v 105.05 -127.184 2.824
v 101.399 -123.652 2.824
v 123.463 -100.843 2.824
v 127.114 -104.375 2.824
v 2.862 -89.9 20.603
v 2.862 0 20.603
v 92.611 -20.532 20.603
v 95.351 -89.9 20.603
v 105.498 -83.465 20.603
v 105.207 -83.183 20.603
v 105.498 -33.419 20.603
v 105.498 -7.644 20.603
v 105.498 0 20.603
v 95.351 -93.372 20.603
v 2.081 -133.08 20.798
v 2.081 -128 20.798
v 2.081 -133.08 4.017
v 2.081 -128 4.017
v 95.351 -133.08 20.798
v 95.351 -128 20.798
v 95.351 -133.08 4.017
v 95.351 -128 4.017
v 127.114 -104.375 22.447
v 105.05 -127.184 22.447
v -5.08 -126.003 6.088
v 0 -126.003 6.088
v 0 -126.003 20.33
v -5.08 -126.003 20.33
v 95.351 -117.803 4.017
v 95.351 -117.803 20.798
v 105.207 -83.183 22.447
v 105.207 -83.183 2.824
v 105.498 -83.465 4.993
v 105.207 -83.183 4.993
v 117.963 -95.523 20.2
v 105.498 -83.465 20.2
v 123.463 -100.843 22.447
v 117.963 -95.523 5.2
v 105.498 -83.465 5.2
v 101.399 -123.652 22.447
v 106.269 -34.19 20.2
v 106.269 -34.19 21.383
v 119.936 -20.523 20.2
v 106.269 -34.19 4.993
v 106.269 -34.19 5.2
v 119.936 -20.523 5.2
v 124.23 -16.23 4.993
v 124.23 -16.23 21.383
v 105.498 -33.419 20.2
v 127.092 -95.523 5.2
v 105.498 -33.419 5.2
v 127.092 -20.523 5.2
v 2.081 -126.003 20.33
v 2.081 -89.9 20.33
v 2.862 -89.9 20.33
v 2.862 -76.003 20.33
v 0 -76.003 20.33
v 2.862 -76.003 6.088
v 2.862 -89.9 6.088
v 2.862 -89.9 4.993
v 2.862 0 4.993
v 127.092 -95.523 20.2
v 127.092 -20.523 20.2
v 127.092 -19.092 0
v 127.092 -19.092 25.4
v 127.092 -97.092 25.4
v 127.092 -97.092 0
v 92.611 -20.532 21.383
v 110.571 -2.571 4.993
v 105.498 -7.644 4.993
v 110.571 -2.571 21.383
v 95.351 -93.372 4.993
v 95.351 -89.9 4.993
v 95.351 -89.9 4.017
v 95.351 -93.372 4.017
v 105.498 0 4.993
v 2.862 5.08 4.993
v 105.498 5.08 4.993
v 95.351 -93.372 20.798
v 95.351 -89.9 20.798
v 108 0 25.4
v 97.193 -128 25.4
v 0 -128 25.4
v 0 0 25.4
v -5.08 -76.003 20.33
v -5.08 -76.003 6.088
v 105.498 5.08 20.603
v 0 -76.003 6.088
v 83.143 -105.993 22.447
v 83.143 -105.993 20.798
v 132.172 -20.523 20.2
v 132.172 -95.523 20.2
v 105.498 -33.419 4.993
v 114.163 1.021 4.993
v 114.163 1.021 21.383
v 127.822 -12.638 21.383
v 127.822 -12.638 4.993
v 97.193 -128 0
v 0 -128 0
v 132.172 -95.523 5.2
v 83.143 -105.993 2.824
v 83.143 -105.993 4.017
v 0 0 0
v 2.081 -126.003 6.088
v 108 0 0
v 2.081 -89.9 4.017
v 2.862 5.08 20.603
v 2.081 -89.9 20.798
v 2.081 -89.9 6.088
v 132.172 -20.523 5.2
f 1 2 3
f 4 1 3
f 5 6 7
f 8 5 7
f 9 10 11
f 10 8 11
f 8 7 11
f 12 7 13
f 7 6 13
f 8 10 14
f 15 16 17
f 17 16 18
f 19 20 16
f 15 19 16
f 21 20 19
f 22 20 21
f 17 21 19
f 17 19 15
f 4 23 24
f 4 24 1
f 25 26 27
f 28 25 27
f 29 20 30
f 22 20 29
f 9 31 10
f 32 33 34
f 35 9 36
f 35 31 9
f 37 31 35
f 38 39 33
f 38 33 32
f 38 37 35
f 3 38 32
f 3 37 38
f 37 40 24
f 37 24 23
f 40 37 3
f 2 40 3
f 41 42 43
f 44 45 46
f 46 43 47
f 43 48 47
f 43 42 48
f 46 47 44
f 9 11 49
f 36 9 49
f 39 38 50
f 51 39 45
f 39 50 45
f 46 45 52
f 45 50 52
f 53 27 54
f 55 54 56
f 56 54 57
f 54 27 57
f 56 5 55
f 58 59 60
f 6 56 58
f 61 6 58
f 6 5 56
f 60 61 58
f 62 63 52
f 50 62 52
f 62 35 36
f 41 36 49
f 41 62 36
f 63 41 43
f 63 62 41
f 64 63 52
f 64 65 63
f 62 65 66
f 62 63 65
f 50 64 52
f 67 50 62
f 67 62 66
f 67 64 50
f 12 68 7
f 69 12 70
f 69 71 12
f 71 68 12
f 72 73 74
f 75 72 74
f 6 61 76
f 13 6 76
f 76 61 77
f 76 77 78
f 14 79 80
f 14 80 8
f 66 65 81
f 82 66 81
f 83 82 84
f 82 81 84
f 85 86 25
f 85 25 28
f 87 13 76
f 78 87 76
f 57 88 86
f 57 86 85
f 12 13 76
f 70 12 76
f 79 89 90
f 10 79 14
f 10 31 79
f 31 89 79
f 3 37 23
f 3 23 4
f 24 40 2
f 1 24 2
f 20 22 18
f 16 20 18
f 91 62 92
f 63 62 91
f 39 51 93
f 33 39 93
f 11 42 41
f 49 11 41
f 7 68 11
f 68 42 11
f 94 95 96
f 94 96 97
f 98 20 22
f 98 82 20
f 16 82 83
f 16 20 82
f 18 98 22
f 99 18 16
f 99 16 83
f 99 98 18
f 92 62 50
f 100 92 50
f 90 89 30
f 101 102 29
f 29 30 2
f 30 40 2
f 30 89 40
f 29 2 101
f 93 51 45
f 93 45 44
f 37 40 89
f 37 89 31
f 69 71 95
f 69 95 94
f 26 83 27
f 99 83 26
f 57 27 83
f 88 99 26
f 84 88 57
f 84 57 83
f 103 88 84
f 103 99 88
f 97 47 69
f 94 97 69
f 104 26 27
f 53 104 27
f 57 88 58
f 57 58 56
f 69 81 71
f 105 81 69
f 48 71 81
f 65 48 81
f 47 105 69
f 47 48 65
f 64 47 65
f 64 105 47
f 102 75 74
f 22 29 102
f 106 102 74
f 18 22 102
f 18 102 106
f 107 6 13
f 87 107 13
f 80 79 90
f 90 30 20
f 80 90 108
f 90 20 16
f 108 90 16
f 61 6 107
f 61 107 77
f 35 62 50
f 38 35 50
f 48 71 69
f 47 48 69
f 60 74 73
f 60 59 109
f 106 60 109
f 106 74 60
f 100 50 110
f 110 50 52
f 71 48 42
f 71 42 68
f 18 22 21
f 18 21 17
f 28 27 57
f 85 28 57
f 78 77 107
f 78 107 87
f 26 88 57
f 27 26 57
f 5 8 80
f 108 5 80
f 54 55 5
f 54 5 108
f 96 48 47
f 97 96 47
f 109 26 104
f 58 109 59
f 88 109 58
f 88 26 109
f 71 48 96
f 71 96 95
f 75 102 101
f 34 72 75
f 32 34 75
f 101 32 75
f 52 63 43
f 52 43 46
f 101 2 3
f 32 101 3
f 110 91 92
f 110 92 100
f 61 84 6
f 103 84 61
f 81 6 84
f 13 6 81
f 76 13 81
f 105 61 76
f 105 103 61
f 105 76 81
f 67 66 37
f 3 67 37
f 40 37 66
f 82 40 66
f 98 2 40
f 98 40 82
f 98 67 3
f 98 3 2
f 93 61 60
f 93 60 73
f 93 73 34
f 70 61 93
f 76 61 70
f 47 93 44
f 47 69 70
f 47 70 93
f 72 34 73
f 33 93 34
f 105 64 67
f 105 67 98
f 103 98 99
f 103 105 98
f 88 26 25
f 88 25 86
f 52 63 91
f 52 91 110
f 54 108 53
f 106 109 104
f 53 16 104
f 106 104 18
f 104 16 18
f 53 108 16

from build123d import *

# Parameters (mm, degrees)
BOSS_EXTRUDE1_DEPTH = 25.4
SKETCH2_W           = 14.241894923
SKETCH2_H           = 50
CUT_EXTRUDE1_DEPTH  = 25.4
SKETCH3_W           = 15
SKETCH3_H           = 75
CUT_EXTRUDE2_DEPTH  = 114.391883
SKETCH4_W           = 93.269947502
SKETCH4_H           = 16.780785534
CUT_EXTRUDE3_DEPTH  = 38.1
SKETCH5_W           = 102.635967335
SKETCH5_H           = 15.610033055
CUT_EXTRUDE4_DEPTH  = 101.6
SKETCH6_W           = 16.390534708
SKETCH6_H           = 19.316430399
CUT_EXTRUDE5_DEPTH  = 25.4
SKETCH7_W           = 19.62251785
SKETCH7_H           = 31.734588897
CUT_EXTRUDE6_DEPTH  = 25.4
SKETCH4_2_W         = 93.269947502
SKETCH4_2_H         = 16.780785534
BOSS_EXTRUDE2_DEPTH = 5.08
SKETCH5_2_W         = 102.635967335
SKETCH5_2_H         = 15.610033055
BOSS_EXTRUDE4_DEPTH = 5.08
SKETCH7_2_W         = 19.62251785
SKETCH7_2_H         = 31.734588897
BOSS_EXTRUDE5_DEPTH = 5.08
SKETCH6_2_W         = 16.390534708
SKETCH6_2_H         = 19.316430399
BOSS_EXTRUDE6_DEPTH = 5.08
SKETCH3_2_W         = 15
SKETCH3_2_H         = 75
BOSS_EXTRUDE7_DEPTH = 5.08
SKETCH2_3_W         = 14.241894923
SKETCH2_3_H         = 50
BOSS_EXTRUDE8_DEPTH = 5.08


with BuildPart() as part:
    # Sketch1 → Boss-Extrude1 (new body)
    with BuildSketch(Plane.XY):
        Polygon((0, 0), (108, 0), (127.091883092, -19.091883092), (127.091883092, -97.091883092), (97.193068366, -128), (0, -128), align=None)
    extrude(amount=BOSS_EXTRUDE1_DEPTH)

    # Sketch2 → Cut-Extrude1 (cut)
    with BuildSketch(Plane.ZY):
        with Locations((13.208639104, -101.003494845)):
            Rectangle(SKETCH2_W, SKETCH2_H)
    extrude(amount=-CUT_EXTRUDE1_DEPTH, mode=Mode.SUBTRACT)

    # Sketch3 → Cut-Extrude2 (cut)
    with BuildSketch(Plane(origin=(127.091883092, 0, 0), x_dir=(0, 0, -1), z_dir=(1, 0, 0))):
        with Locations((-12.7, -58.023490523)):
            Rectangle(SKETCH3_W, SKETCH3_H)
    extrude(amount=-CUT_EXTRUDE2_DEPTH, mode=Mode.SUBTRACT)

    # Sketch4 → Cut-Extrude3 (cut)
    with BuildSketch(Plane(origin=(0, -128, 0), x_dir=(-1, 0, 0), z_dir=(0, -1, 0))):
        with Locations((-48.716410144, -12.40731188)):
            Rectangle(SKETCH4_W, SKETCH4_H)
    extrude(amount=-CUT_EXTRUDE3_DEPTH, mode=Mode.SUBTRACT)

    # Sketch5 → Cut-Extrude4 (cut)
    with BuildSketch(Plane(origin=(0, 0, 0), x_dir=(1, 0, 0), z_dir=(0, 1, 0))):
        with Locations((54.179921714, -12.797562707)):
            Rectangle(SKETCH5_W, SKETCH5_H)
    extrude(amount=-CUT_EXTRUDE4_DEPTH, mode=Mode.SUBTRACT)

    # Sketch6 → Cut-Extrude5 (cut)
    with BuildSketch(Plane(origin=(54, 54, 0), x_dir=(0, 0, -1), z_dir=(0.707106781, 0.707106781, 0))):
        with Locations((-13.187813533, -89.661925571)):
            Rectangle(SKETCH6_W, SKETCH6_H)
    extrude(amount=-CUT_EXTRUDE5_DEPTH, mode=Mode.SUBTRACT)

    # Sketch7 → Cut-Extrude6 (cut)
    with BuildSketch(Plane(origin=(114.174090835, -110.445744673, 0), x_dir=(0, 0, -1), z_dir=(0.71874467, -0.695274118, 0))):
        with Locations((-12.635731111, -2.507429786)):
            Rectangle(SKETCH7_W, SKETCH7_H)
    extrude(amount=-CUT_EXTRUDE6_DEPTH, mode=Mode.SUBTRACT)


with BuildPart() as body_2:
    # Sketch4<2> → Boss-Extrude2 (new body)
    with BuildSketch(Plane(origin=(0, -128, 0), x_dir=(-1, 0, 0), z_dir=(0, -1, 0))):
        with Locations((-48.716410144, -12.40731188)):
            Rectangle(SKETCH4_2_W, SKETCH4_2_H)
    extrude(amount=BOSS_EXTRUDE2_DEPTH)


with BuildPart() as body_3:
    # Sketch5<2> → Boss-Extrude4 (new body)
    with BuildSketch(Plane(origin=(0, 0, 0), x_dir=(1, 0, 0), z_dir=(0, 1, 0))):
        with Locations((54.179921714, -12.797562707)):
            Rectangle(SKETCH5_2_W, SKETCH5_2_H)
    extrude(amount=BOSS_EXTRUDE4_DEPTH)


with BuildPart() as body_4:
    # Sketch7<2> → Boss-Extrude5 (new body)
    with BuildSketch(Plane(origin=(114.174090835, -110.445744673, 0), x_dir=(0, 0, -1), z_dir=(0.71874467, -0.695274118, 0))):
        with Locations((-12.635731111, -2.507429786)):
            Rectangle(SKETCH7_2_W, SKETCH7_2_H)
    extrude(amount=BOSS_EXTRUDE5_DEPTH)


with BuildPart() as body_5:
    # Sketch6<2> → Boss-Extrude6 (new body)
    with BuildSketch(Plane(origin=(54, 54, 0), x_dir=(0, 0, -1), z_dir=(0.707106781, 0.707106781, 0))):
        with Locations((-13.187813533, -89.661925571)):
            Rectangle(SKETCH6_2_W, SKETCH6_2_H)
    extrude(amount=BOSS_EXTRUDE6_DEPTH)


with BuildPart() as body_6:
    # Sketch3<2> → Boss-Extrude7 (new body)
    with BuildSketch(Plane(origin=(127.091883092, 0, 0), x_dir=(0, 0, -1), z_dir=(1, 0, 0))):
        with Locations((-12.7, -58.023490523)):
            Rectangle(SKETCH3_2_W, SKETCH3_2_H)
    extrude(amount=BOSS_EXTRUDE7_DEPTH)


with BuildPart() as body_7:
    # Sketch2<3> → Boss-Extrude8 (new body)
    with BuildSketch(Plane.ZY):
        with Locations((13.208639104, -101.003494845)):
            Rectangle(SKETCH2_3_W, SKETCH2_3_H)
    extrude(amount=BOSS_EXTRUDE8_DEPTH)


solid = Compound([part.part, body_2.part, body_3.part, body_4.part, body_5.part, body_6.part, body_7.part])
